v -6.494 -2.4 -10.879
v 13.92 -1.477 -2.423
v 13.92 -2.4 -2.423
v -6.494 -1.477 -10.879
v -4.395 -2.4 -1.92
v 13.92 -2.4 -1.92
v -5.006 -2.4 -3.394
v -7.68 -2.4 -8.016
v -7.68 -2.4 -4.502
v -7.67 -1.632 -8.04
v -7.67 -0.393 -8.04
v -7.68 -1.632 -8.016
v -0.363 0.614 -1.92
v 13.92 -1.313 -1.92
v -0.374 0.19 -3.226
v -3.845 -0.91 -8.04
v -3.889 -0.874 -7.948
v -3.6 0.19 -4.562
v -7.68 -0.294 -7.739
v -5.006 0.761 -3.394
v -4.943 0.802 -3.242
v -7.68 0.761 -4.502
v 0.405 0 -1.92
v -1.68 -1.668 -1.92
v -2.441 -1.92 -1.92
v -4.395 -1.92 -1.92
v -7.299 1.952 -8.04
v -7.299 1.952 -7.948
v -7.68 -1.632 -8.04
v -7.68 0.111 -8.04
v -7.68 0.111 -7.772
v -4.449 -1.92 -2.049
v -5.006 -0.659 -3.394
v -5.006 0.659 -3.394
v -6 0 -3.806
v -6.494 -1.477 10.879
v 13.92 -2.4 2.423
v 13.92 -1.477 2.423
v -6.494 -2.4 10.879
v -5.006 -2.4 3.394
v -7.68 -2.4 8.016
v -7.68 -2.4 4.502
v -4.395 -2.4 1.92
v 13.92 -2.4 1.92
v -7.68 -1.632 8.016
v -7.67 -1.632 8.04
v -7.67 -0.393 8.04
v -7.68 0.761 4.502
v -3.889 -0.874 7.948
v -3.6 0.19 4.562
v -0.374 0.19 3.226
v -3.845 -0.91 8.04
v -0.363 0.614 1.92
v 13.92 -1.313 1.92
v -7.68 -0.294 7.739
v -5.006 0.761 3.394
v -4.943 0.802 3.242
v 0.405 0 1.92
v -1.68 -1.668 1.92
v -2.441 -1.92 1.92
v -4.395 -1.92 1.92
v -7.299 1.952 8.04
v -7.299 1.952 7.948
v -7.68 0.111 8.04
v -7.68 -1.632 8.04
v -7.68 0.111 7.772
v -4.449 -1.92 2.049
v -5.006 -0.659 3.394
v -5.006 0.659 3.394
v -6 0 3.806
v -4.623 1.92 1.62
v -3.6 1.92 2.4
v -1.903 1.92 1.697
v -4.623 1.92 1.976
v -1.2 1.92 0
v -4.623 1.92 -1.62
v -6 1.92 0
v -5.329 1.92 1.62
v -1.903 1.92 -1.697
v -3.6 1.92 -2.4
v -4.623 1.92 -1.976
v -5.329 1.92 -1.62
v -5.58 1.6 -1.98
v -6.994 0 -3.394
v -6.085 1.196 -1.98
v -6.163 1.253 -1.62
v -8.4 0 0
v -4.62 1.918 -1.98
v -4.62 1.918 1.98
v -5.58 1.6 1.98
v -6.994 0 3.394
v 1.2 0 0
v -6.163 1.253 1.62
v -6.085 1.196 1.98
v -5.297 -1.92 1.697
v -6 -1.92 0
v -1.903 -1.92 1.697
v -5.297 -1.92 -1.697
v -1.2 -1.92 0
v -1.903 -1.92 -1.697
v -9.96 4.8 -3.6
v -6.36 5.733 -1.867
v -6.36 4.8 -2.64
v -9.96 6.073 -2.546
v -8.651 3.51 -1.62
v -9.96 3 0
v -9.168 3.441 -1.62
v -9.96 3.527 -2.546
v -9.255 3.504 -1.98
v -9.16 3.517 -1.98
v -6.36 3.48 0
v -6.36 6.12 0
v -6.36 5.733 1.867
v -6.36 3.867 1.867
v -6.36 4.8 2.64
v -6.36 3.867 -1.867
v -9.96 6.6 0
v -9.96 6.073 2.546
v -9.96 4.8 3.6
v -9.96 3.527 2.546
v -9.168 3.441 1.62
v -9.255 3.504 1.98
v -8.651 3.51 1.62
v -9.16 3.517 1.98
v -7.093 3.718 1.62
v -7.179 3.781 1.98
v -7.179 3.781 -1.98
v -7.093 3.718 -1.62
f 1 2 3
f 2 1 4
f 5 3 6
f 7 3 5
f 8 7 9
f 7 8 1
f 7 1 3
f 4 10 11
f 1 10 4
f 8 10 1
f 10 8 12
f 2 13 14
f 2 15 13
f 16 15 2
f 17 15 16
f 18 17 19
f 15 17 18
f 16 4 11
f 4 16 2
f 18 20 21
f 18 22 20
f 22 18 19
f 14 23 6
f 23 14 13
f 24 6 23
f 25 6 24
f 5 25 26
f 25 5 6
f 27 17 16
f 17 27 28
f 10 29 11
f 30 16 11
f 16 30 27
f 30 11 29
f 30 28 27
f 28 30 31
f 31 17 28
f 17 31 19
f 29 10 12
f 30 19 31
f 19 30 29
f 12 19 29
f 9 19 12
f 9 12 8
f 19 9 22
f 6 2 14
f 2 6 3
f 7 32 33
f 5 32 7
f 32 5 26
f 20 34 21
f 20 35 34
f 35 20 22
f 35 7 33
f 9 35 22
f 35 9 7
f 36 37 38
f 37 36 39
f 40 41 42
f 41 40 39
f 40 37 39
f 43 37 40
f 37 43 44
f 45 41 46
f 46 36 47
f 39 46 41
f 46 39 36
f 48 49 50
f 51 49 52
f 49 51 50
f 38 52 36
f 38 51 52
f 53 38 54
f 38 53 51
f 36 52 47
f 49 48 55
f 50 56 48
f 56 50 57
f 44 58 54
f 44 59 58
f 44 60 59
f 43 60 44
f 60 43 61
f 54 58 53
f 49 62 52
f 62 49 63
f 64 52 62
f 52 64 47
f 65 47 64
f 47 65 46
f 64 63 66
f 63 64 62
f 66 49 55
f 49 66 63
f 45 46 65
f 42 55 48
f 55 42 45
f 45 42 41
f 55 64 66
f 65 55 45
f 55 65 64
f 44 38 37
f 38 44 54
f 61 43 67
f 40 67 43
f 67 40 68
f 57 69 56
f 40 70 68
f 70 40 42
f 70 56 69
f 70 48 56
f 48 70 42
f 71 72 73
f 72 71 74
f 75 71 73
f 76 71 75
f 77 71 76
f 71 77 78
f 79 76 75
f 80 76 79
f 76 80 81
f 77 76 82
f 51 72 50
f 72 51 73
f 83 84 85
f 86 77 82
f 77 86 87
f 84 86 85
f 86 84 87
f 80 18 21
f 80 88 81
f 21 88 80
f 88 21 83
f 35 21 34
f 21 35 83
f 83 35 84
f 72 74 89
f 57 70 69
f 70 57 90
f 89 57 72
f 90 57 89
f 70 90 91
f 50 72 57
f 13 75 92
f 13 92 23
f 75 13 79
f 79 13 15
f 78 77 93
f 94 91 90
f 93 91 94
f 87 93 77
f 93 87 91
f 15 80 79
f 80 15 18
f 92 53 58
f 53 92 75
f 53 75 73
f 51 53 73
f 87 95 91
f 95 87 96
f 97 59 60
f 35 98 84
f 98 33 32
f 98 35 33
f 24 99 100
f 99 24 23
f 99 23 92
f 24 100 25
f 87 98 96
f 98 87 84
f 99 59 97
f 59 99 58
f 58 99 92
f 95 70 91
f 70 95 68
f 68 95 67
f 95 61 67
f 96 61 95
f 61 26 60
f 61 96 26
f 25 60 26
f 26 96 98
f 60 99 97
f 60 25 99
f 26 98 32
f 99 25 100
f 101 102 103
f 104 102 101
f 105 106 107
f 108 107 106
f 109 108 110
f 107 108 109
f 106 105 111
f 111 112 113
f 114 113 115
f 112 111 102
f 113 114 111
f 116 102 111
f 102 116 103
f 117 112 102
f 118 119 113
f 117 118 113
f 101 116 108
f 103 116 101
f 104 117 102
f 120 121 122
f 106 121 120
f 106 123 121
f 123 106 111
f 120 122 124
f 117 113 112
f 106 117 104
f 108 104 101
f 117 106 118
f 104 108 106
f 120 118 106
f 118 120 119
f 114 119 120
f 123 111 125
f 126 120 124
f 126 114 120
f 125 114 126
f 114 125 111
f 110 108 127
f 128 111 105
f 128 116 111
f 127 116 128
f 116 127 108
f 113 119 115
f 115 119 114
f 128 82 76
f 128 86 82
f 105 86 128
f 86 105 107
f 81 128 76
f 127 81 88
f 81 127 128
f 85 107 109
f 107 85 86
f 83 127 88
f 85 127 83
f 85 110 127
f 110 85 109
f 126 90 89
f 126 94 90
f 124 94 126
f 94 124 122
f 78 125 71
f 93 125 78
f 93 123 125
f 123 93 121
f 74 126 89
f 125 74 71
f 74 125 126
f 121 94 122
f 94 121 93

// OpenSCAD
module first_wedge() {
	difference() {
		cube(size = [10,10,1], center = true);
		translate(v = [5, 0, 0.2]) {
			rotate(a = 10,  v = [0, 1, 0])
			cube(size = [11,11,1], center = true);
		}
	}
}

module second_wedge()
{
	translate(v = [-2, 0, 0]) {
		rotate(a = -45 / 2, v = [0, 0, 1]) {
			difference() {
				first_wedge();
				rotate(a = 45 / 2, v = [0, 0, 1]) {
					translate(v = [-2.70, 0, 0]) {
						cube(size = [11, 16, 5], center = true);
					}
				}
			}
		}
	}
}

module fin()
{
	scale(v = [0.2, 0.2, 0.2]) {
		rotate(a = -90, v = [0, 1, 0]) {
			second_wedge();
		}
	}

}

module third_wedge()
{
	difference() {
		union() {
			translate(v = [3.25, 2.5, -0.5]) 
				fin();
			second_wedge();
		}
		translate(v = [0, 5.7, 0])
			cube(size = [10, 5, 5], center = true);
		translate(v = [0, -8.3, 0])
			cube(size = [10, 5, 5], center = true);
	}
}

module fourth_wedge()
{
	difference() {
		third_wedge();
		translate(v = [0, 3.5, 0])
			cylinder(h = 5, r1 = 2, r2 = 2, center = true);
	}
}

module pod()
{
	union() {
		cylinder(h = 0.4, r1 = 2, r2 = 1, center = true);
		translate(v = [0, 0, -0.4])
			cylinder(h = 0.4, r1 = 1, r2 = 2, center = true);
	}
}

module fifth_wedge()
{
	union() {
		fourth_wedge();
		mirror(v = [1, 0, 0])
			fourth_wedge();
		translate(v = [0, 1.5, 0.20])
			pod();
	}
}

module bridge_buttress()
{
	rotate(a = 20, v = [1, 0, 0])
		cube(size = [0.15, 2.4, 0.35], center = true);
}

module bridge()
{
	rotate(a = 90, v = [1, 0, 0])
		scale(v = [1, 0.25, 1])
			cylinder(h = 1.5, r1 = 1.5, r2 = 1.1, center = true);
	
}

module sixth_wedge()
{
	union() {
		translate(v = [0, 3.4, 1.0])
			bridge();
		fifth_wedge();
		translate(v = [0.75, 2.85, 0.55])
			bridge_buttress();
		translate(v = [-0.75, 2.85, 0.55])
			bridge_buttress();
	}
}

$fn = 8;
rotate(a = 90, v = [0, 1, 0])
	rotate(a = -90, v = [1, 0, 0])
	scale (v = [2.4, 2.4, 4.8])
		sixth_wedge();
